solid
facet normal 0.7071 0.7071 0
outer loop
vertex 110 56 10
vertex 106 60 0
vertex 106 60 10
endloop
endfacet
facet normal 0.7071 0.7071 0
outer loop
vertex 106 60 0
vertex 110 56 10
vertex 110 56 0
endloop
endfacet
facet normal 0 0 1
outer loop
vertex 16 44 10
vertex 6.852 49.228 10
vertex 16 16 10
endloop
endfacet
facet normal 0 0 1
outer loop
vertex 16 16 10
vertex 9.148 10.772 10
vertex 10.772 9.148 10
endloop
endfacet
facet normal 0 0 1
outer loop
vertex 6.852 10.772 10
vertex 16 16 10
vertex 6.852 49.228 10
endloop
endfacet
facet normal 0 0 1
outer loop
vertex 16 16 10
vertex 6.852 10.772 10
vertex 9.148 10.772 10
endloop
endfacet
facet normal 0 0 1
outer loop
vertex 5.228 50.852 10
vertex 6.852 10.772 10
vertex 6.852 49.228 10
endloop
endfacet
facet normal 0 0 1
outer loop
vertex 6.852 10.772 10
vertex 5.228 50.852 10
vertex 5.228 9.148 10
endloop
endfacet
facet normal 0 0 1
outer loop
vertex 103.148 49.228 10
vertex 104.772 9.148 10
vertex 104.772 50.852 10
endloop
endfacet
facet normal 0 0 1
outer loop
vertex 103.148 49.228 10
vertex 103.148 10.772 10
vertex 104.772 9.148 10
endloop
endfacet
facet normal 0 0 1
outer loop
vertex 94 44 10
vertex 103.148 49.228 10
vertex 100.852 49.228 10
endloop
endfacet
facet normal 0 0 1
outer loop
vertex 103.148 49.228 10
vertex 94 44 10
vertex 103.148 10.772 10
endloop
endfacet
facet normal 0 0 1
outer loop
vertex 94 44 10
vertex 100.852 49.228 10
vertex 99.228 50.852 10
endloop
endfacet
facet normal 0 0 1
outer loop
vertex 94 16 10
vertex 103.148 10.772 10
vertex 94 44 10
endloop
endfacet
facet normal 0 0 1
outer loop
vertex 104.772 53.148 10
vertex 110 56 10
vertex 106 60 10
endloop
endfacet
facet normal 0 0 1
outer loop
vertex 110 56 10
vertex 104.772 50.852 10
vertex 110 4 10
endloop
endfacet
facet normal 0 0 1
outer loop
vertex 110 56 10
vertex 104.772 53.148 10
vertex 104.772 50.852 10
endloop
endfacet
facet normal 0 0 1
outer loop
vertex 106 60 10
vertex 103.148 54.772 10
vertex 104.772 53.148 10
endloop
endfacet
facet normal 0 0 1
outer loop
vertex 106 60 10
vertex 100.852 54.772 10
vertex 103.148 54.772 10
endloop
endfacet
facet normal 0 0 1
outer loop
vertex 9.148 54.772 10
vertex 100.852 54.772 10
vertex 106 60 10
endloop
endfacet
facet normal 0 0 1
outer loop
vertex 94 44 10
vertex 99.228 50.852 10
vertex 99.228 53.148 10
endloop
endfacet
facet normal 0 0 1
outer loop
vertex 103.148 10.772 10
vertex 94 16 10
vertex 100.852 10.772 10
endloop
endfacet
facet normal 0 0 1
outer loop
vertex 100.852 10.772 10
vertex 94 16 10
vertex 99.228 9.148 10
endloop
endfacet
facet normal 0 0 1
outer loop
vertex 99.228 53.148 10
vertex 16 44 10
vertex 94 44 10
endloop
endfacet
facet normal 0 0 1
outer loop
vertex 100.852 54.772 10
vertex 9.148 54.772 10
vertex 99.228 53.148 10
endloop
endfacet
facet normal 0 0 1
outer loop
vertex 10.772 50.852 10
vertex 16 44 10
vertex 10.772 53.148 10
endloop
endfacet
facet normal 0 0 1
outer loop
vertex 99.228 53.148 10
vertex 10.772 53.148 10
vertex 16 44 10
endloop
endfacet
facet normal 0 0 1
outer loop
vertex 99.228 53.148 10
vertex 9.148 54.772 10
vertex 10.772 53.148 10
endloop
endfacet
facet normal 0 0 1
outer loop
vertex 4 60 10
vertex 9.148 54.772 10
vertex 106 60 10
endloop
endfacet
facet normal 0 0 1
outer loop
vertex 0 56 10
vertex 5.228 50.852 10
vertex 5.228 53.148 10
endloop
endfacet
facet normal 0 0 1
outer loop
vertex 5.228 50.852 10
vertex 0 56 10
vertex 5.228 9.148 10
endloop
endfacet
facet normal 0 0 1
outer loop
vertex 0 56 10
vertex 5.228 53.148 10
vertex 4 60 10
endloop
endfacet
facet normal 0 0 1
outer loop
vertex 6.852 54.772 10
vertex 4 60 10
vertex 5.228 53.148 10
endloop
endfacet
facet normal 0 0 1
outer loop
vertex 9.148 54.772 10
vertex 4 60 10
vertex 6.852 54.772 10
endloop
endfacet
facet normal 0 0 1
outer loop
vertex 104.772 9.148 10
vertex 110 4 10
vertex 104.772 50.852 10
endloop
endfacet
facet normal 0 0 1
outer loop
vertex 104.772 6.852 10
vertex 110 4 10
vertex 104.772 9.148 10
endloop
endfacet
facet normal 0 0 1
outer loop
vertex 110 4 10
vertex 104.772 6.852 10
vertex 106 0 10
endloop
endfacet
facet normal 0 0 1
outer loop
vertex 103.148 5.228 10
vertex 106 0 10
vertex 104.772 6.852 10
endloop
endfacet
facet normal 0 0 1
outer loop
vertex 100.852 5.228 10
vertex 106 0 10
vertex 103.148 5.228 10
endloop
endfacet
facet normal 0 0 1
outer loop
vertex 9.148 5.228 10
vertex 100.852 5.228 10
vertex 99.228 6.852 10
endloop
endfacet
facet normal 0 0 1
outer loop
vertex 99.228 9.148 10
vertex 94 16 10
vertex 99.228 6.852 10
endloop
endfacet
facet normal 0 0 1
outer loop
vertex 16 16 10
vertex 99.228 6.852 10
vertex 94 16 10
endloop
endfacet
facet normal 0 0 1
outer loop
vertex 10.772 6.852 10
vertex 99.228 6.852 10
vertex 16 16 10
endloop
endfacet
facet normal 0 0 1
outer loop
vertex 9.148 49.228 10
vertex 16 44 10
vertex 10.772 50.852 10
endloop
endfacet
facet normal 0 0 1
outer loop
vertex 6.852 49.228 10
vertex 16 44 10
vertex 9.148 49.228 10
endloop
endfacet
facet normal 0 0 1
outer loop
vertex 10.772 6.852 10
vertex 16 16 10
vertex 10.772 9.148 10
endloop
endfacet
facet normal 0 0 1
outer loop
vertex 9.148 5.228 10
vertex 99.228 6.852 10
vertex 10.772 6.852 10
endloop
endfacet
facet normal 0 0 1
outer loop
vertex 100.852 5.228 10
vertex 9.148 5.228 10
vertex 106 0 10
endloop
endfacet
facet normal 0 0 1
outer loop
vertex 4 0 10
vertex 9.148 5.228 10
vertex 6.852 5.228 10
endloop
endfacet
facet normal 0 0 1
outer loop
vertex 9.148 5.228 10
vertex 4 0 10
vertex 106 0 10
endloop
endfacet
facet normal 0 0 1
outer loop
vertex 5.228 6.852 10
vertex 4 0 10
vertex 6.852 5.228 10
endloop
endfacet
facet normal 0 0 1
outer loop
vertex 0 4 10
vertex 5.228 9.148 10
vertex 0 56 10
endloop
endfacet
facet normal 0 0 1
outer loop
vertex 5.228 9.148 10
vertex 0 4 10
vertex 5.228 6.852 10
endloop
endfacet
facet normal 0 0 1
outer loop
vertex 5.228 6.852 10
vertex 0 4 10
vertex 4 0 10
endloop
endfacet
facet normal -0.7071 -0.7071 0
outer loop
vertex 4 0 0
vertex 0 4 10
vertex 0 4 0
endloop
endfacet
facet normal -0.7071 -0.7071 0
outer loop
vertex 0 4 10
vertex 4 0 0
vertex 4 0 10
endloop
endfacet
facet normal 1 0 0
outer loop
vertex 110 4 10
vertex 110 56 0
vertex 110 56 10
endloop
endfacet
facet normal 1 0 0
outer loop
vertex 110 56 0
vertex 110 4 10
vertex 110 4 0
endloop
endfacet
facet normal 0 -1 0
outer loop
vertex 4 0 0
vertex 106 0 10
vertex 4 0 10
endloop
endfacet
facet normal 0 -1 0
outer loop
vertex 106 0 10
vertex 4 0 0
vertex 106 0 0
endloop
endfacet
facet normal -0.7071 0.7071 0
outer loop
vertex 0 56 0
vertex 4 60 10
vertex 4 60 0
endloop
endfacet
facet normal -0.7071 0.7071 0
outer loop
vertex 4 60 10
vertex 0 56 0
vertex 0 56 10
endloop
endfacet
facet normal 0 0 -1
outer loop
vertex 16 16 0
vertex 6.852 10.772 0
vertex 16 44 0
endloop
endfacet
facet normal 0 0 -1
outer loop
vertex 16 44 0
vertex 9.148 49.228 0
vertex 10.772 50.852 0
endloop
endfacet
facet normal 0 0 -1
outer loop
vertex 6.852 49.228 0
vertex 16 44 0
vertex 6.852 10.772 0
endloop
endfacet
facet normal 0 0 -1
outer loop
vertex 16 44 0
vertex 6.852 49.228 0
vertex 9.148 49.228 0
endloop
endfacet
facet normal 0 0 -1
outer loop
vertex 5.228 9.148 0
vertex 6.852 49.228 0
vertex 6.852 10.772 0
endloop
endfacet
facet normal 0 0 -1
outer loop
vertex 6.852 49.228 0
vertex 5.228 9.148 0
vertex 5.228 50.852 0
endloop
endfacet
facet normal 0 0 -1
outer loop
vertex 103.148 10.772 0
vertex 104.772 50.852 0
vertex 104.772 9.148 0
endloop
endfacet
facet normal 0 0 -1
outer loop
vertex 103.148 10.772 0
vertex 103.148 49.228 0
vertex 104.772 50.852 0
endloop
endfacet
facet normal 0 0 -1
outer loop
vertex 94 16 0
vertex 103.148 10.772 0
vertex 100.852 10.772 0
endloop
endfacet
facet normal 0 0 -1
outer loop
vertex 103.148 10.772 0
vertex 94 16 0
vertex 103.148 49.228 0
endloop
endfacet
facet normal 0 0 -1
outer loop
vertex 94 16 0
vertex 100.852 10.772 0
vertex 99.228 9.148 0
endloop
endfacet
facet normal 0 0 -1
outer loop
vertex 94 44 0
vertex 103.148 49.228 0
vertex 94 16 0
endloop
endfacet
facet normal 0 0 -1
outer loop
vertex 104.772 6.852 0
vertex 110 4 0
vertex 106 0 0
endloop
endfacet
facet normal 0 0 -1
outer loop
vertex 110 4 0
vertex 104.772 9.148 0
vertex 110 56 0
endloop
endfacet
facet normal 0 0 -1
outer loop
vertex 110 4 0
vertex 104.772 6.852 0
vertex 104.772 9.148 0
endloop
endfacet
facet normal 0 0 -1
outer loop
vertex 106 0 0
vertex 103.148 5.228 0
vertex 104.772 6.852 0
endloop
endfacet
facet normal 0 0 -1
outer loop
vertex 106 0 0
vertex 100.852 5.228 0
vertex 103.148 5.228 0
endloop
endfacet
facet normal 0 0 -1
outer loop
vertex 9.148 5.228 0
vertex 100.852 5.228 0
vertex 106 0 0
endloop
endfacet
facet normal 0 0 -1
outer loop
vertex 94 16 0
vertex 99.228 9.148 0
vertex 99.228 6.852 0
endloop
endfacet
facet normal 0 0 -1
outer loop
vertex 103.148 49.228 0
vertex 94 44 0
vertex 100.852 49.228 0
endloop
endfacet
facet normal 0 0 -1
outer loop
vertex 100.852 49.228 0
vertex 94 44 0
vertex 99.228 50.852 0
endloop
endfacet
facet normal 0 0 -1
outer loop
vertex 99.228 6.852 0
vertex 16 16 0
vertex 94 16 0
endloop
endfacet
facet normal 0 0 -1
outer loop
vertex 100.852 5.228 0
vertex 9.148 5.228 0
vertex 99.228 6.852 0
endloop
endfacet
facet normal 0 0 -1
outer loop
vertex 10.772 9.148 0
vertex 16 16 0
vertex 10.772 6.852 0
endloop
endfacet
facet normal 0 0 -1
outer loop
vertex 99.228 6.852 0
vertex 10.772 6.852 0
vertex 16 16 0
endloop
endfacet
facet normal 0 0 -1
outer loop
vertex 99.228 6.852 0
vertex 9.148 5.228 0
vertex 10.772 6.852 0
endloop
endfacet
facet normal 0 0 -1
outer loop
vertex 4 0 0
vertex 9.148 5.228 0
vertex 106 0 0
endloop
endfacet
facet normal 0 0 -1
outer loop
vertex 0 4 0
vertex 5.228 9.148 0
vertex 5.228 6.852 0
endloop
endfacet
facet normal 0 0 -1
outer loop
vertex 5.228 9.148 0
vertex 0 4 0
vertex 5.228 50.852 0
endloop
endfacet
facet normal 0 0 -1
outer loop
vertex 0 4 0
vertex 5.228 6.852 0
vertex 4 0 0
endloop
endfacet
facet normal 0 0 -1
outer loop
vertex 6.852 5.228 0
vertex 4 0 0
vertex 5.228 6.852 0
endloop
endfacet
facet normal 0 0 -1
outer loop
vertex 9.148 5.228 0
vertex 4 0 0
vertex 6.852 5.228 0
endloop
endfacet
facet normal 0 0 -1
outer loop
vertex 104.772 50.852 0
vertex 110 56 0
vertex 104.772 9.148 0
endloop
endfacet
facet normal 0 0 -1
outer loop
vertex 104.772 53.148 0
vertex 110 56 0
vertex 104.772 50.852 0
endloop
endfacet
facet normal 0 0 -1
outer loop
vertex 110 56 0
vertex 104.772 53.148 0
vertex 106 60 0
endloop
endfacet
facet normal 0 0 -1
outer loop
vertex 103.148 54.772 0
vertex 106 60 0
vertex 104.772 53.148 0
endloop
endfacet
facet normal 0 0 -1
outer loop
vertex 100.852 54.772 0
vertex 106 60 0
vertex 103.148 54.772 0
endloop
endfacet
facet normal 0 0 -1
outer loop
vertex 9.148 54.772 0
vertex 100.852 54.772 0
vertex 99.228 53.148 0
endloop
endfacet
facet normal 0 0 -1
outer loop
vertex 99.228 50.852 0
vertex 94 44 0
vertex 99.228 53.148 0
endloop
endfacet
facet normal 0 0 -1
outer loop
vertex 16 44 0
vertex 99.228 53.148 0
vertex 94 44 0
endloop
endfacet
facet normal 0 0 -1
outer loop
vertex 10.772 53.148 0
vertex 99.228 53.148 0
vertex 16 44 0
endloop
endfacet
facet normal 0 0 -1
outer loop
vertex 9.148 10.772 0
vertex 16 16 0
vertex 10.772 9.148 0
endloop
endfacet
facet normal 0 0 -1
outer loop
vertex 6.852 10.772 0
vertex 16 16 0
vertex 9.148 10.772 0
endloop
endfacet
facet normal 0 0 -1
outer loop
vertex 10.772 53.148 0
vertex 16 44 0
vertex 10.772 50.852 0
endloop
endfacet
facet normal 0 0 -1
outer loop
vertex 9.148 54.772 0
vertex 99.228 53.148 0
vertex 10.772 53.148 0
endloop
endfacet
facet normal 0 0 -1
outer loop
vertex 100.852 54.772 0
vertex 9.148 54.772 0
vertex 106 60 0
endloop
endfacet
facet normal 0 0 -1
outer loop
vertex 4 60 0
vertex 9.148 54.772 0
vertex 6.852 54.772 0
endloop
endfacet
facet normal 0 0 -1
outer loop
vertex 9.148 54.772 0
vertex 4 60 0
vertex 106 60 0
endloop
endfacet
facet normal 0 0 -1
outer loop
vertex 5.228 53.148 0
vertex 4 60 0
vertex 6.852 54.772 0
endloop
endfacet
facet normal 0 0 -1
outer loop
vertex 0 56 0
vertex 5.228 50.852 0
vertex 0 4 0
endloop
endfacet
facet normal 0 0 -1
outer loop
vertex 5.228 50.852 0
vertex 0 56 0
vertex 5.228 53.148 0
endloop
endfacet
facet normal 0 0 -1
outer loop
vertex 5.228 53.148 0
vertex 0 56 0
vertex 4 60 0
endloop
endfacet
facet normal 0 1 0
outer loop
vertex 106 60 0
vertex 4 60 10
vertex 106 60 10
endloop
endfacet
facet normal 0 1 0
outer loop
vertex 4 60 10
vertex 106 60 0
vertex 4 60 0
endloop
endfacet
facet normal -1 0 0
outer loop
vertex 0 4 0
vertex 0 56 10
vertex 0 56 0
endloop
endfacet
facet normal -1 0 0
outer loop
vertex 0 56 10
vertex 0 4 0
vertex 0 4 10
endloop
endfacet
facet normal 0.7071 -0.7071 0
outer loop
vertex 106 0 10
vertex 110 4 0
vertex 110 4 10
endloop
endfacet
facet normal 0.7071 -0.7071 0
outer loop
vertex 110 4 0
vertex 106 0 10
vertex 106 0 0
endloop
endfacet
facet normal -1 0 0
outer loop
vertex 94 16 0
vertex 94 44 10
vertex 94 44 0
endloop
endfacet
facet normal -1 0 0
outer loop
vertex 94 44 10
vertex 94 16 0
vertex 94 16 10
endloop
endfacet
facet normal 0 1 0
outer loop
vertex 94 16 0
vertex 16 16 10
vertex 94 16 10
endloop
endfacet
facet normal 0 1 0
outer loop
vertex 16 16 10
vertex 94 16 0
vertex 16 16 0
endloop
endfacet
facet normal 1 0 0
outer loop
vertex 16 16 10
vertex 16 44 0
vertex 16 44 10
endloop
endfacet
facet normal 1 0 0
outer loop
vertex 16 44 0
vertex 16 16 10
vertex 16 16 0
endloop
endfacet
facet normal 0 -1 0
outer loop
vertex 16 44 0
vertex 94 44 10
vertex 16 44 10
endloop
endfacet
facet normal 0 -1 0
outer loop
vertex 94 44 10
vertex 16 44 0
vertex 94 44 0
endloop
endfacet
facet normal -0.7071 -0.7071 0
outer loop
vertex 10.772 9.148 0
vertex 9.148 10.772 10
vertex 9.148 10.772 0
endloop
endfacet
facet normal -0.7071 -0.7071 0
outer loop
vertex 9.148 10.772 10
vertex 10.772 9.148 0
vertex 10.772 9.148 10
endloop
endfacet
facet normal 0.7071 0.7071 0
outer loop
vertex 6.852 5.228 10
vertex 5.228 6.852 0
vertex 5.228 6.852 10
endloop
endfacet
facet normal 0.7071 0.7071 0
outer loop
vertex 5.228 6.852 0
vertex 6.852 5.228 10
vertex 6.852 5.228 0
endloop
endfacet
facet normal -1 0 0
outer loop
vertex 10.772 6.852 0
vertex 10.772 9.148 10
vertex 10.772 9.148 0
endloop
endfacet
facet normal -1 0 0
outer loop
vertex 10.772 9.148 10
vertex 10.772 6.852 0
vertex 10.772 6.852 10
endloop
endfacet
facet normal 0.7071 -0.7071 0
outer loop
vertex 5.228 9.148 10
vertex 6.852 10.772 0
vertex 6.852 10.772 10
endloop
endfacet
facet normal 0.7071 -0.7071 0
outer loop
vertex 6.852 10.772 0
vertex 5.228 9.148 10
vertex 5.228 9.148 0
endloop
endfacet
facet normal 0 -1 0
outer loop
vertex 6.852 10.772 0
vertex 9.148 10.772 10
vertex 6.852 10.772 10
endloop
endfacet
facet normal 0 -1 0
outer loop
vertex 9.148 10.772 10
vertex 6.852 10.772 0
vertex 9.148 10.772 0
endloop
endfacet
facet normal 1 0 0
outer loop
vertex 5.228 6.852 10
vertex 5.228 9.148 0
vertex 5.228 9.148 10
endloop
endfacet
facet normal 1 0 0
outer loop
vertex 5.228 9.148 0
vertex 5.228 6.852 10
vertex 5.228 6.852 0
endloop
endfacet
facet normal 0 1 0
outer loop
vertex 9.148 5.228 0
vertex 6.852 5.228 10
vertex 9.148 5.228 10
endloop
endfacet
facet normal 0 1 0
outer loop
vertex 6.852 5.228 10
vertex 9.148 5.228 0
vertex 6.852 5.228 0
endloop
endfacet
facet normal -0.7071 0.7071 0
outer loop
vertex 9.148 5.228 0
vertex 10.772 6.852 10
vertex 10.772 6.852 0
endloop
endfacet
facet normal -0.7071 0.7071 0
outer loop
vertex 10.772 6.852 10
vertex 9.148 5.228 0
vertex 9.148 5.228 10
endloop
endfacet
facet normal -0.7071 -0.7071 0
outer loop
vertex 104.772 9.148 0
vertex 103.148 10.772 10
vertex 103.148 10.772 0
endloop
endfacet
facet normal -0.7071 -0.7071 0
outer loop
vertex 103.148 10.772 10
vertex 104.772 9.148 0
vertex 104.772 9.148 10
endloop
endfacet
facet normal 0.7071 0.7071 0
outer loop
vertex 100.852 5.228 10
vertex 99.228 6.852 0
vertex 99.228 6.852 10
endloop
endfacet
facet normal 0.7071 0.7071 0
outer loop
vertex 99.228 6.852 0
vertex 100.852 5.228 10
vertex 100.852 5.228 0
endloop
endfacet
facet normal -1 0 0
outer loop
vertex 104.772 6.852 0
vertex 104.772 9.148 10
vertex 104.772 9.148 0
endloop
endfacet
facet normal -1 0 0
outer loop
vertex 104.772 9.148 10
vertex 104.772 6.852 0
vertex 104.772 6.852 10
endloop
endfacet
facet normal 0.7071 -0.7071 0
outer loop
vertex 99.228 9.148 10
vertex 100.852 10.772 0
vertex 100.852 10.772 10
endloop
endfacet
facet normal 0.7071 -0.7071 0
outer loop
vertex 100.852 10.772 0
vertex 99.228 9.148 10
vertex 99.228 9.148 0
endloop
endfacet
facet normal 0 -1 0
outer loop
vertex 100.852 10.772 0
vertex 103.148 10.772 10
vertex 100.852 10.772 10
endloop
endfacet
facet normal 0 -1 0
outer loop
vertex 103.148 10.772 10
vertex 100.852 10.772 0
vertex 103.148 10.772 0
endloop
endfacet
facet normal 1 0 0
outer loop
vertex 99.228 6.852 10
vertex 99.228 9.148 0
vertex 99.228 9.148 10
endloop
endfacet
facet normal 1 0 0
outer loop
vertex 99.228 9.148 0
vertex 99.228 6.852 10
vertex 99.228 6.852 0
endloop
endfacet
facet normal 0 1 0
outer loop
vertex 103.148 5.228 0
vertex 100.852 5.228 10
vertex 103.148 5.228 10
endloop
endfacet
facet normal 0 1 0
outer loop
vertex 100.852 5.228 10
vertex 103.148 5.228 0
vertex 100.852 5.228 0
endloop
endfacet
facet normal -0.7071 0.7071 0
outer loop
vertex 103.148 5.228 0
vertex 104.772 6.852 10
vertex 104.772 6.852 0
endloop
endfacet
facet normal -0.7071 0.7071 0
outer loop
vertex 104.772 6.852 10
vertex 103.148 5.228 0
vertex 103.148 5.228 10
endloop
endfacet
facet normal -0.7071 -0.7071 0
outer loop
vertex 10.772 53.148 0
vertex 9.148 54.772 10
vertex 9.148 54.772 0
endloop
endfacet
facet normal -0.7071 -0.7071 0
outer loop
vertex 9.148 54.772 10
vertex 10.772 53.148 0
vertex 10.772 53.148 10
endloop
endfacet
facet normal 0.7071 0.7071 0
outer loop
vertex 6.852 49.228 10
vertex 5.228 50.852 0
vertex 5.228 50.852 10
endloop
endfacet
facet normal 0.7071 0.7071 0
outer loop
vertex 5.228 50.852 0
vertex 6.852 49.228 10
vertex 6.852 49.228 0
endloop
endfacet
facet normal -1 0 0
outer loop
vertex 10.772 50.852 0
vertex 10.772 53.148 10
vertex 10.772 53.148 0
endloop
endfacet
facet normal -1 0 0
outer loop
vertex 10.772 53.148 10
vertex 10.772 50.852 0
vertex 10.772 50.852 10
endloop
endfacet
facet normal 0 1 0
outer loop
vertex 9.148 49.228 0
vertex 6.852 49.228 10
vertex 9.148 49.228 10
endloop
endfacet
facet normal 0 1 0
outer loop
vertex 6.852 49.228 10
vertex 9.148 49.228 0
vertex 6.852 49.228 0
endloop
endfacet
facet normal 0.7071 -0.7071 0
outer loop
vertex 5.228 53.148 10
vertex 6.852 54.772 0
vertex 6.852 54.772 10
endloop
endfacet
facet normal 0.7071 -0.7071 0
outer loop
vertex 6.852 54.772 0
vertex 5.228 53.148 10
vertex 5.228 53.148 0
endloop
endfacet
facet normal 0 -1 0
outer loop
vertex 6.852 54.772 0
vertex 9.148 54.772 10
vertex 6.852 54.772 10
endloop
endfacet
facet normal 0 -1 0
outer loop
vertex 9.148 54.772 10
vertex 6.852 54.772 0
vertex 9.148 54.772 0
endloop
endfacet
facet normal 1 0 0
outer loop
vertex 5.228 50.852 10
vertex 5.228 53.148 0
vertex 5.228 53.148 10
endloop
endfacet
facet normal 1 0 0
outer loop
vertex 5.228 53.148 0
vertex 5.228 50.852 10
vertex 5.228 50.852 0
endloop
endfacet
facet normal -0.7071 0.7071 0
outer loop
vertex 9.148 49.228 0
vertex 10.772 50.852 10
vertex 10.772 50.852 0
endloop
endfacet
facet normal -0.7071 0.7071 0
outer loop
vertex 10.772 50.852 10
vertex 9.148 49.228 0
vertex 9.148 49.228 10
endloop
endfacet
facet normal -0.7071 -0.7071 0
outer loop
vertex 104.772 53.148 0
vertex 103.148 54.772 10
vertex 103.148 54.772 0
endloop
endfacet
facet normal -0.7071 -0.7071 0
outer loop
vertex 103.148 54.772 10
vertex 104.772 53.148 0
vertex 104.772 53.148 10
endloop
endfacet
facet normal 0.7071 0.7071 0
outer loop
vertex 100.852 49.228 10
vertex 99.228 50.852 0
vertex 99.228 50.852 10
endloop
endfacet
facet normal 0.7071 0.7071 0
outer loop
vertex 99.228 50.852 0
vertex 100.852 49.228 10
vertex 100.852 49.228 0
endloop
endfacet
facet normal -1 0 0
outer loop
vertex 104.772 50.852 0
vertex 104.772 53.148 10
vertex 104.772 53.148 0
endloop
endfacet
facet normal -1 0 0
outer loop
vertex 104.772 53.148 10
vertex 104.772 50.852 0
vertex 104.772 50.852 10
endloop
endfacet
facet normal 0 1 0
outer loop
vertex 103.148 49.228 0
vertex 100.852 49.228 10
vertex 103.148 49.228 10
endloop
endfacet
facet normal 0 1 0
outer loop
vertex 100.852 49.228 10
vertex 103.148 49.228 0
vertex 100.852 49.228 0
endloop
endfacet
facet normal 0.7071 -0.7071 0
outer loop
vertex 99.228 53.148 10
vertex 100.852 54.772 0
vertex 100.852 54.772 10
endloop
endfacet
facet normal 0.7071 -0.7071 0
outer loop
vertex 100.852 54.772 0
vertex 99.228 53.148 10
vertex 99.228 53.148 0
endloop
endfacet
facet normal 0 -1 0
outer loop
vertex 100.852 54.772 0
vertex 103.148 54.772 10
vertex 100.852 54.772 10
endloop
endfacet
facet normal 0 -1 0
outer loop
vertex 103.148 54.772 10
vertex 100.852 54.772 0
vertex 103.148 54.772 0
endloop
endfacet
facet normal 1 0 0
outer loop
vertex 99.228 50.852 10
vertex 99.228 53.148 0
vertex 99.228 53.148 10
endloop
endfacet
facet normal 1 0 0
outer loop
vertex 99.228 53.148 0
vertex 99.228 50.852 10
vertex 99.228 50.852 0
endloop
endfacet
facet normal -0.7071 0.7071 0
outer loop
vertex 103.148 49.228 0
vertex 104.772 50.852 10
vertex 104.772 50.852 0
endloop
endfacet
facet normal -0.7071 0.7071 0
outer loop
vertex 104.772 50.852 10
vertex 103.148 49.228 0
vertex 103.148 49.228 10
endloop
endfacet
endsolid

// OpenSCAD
$fn = 32;

// ----------------------------------------------------------------------
// Frame plate: 110 x 60 frame, 16 mm rails
// ----------------------------------------------------------------------

// --- parameters (mm) ---
plate_l = 110;            // plate length, X
plate_w = 60;             // plate width, Y
plate_t = 10;             // plate thickness, Z (extrusion height)
corner_c = 4;             // corner chamfer
frame_bar = 16;           // frame rail width
bolt_r = 3;               // corner bolt window radius
bolt_inset = 8;           // bolt centre inset from the edges

win_l = plate_l - 2 * frame_bar;  // window length
win_w = plate_w - 2 * frame_bar;  // window width
bolt_d = 2 * bolt_r;  // corner hole diameter

profile = [[4, 0], [106, 0], [110, 4], [110, 56], [106, 60], [4, 60], [0, 56], [0, 4]];  // primary outline, 8 points, counter clockwise
void_1 = [[16, 16], [94, 16], [94, 44], [16, 44]];  // the window, 4 points
void_2 = [[10.772, 9.148], [9.148, 10.772], [6.852, 10.772], [5.228, 9.148], [5.228, 6.852], [6.852, 5.228], [9.148, 5.228], [10.772, 6.852]];  // corner bolt window, 8 points
void_3 = [[104.772, 9.148], [103.148, 10.772], [100.852, 10.772], [99.228, 9.148], [99.228, 6.852], [100.852, 5.228], [103.148, 5.228], [104.772, 6.852]];  // corner bolt window, 8 points
void_4 = [[10.772, 53.148], [9.148, 54.772], [6.852, 54.772], [5.228, 53.148], [5.228, 50.852], [6.852, 49.228], [9.148, 49.228], [10.772, 50.852]];  // corner bolt window, 8 points
void_5 = [[104.772, 53.148], [103.148, 54.772], [100.852, 54.772], [99.228, 53.148], [99.228, 50.852], [100.852, 49.228], [103.148, 49.228], [104.772, 50.852]];  // corner bolt window, 8 points

// --- the one profile operation ---
difference() {
  linear_extrude(height = plate_t) polygon(points = profile);
  translate([0, 0, -1])
    linear_extrude(height = plate_t + 2) polygon(points = void_1);
  translate([0, 0, -1])
    linear_extrude(height = plate_t + 2) polygon(points = void_2);
  translate([0, 0, -1])
    linear_extrude(height = plate_t + 2) polygon(points = void_3);
  translate([0, 0, -1])
    linear_extrude(height = plate_t + 2) polygon(points = void_4);
  translate([0, 0, -1])
    linear_extrude(height = plate_t + 2) polygon(points = void_5);
}
